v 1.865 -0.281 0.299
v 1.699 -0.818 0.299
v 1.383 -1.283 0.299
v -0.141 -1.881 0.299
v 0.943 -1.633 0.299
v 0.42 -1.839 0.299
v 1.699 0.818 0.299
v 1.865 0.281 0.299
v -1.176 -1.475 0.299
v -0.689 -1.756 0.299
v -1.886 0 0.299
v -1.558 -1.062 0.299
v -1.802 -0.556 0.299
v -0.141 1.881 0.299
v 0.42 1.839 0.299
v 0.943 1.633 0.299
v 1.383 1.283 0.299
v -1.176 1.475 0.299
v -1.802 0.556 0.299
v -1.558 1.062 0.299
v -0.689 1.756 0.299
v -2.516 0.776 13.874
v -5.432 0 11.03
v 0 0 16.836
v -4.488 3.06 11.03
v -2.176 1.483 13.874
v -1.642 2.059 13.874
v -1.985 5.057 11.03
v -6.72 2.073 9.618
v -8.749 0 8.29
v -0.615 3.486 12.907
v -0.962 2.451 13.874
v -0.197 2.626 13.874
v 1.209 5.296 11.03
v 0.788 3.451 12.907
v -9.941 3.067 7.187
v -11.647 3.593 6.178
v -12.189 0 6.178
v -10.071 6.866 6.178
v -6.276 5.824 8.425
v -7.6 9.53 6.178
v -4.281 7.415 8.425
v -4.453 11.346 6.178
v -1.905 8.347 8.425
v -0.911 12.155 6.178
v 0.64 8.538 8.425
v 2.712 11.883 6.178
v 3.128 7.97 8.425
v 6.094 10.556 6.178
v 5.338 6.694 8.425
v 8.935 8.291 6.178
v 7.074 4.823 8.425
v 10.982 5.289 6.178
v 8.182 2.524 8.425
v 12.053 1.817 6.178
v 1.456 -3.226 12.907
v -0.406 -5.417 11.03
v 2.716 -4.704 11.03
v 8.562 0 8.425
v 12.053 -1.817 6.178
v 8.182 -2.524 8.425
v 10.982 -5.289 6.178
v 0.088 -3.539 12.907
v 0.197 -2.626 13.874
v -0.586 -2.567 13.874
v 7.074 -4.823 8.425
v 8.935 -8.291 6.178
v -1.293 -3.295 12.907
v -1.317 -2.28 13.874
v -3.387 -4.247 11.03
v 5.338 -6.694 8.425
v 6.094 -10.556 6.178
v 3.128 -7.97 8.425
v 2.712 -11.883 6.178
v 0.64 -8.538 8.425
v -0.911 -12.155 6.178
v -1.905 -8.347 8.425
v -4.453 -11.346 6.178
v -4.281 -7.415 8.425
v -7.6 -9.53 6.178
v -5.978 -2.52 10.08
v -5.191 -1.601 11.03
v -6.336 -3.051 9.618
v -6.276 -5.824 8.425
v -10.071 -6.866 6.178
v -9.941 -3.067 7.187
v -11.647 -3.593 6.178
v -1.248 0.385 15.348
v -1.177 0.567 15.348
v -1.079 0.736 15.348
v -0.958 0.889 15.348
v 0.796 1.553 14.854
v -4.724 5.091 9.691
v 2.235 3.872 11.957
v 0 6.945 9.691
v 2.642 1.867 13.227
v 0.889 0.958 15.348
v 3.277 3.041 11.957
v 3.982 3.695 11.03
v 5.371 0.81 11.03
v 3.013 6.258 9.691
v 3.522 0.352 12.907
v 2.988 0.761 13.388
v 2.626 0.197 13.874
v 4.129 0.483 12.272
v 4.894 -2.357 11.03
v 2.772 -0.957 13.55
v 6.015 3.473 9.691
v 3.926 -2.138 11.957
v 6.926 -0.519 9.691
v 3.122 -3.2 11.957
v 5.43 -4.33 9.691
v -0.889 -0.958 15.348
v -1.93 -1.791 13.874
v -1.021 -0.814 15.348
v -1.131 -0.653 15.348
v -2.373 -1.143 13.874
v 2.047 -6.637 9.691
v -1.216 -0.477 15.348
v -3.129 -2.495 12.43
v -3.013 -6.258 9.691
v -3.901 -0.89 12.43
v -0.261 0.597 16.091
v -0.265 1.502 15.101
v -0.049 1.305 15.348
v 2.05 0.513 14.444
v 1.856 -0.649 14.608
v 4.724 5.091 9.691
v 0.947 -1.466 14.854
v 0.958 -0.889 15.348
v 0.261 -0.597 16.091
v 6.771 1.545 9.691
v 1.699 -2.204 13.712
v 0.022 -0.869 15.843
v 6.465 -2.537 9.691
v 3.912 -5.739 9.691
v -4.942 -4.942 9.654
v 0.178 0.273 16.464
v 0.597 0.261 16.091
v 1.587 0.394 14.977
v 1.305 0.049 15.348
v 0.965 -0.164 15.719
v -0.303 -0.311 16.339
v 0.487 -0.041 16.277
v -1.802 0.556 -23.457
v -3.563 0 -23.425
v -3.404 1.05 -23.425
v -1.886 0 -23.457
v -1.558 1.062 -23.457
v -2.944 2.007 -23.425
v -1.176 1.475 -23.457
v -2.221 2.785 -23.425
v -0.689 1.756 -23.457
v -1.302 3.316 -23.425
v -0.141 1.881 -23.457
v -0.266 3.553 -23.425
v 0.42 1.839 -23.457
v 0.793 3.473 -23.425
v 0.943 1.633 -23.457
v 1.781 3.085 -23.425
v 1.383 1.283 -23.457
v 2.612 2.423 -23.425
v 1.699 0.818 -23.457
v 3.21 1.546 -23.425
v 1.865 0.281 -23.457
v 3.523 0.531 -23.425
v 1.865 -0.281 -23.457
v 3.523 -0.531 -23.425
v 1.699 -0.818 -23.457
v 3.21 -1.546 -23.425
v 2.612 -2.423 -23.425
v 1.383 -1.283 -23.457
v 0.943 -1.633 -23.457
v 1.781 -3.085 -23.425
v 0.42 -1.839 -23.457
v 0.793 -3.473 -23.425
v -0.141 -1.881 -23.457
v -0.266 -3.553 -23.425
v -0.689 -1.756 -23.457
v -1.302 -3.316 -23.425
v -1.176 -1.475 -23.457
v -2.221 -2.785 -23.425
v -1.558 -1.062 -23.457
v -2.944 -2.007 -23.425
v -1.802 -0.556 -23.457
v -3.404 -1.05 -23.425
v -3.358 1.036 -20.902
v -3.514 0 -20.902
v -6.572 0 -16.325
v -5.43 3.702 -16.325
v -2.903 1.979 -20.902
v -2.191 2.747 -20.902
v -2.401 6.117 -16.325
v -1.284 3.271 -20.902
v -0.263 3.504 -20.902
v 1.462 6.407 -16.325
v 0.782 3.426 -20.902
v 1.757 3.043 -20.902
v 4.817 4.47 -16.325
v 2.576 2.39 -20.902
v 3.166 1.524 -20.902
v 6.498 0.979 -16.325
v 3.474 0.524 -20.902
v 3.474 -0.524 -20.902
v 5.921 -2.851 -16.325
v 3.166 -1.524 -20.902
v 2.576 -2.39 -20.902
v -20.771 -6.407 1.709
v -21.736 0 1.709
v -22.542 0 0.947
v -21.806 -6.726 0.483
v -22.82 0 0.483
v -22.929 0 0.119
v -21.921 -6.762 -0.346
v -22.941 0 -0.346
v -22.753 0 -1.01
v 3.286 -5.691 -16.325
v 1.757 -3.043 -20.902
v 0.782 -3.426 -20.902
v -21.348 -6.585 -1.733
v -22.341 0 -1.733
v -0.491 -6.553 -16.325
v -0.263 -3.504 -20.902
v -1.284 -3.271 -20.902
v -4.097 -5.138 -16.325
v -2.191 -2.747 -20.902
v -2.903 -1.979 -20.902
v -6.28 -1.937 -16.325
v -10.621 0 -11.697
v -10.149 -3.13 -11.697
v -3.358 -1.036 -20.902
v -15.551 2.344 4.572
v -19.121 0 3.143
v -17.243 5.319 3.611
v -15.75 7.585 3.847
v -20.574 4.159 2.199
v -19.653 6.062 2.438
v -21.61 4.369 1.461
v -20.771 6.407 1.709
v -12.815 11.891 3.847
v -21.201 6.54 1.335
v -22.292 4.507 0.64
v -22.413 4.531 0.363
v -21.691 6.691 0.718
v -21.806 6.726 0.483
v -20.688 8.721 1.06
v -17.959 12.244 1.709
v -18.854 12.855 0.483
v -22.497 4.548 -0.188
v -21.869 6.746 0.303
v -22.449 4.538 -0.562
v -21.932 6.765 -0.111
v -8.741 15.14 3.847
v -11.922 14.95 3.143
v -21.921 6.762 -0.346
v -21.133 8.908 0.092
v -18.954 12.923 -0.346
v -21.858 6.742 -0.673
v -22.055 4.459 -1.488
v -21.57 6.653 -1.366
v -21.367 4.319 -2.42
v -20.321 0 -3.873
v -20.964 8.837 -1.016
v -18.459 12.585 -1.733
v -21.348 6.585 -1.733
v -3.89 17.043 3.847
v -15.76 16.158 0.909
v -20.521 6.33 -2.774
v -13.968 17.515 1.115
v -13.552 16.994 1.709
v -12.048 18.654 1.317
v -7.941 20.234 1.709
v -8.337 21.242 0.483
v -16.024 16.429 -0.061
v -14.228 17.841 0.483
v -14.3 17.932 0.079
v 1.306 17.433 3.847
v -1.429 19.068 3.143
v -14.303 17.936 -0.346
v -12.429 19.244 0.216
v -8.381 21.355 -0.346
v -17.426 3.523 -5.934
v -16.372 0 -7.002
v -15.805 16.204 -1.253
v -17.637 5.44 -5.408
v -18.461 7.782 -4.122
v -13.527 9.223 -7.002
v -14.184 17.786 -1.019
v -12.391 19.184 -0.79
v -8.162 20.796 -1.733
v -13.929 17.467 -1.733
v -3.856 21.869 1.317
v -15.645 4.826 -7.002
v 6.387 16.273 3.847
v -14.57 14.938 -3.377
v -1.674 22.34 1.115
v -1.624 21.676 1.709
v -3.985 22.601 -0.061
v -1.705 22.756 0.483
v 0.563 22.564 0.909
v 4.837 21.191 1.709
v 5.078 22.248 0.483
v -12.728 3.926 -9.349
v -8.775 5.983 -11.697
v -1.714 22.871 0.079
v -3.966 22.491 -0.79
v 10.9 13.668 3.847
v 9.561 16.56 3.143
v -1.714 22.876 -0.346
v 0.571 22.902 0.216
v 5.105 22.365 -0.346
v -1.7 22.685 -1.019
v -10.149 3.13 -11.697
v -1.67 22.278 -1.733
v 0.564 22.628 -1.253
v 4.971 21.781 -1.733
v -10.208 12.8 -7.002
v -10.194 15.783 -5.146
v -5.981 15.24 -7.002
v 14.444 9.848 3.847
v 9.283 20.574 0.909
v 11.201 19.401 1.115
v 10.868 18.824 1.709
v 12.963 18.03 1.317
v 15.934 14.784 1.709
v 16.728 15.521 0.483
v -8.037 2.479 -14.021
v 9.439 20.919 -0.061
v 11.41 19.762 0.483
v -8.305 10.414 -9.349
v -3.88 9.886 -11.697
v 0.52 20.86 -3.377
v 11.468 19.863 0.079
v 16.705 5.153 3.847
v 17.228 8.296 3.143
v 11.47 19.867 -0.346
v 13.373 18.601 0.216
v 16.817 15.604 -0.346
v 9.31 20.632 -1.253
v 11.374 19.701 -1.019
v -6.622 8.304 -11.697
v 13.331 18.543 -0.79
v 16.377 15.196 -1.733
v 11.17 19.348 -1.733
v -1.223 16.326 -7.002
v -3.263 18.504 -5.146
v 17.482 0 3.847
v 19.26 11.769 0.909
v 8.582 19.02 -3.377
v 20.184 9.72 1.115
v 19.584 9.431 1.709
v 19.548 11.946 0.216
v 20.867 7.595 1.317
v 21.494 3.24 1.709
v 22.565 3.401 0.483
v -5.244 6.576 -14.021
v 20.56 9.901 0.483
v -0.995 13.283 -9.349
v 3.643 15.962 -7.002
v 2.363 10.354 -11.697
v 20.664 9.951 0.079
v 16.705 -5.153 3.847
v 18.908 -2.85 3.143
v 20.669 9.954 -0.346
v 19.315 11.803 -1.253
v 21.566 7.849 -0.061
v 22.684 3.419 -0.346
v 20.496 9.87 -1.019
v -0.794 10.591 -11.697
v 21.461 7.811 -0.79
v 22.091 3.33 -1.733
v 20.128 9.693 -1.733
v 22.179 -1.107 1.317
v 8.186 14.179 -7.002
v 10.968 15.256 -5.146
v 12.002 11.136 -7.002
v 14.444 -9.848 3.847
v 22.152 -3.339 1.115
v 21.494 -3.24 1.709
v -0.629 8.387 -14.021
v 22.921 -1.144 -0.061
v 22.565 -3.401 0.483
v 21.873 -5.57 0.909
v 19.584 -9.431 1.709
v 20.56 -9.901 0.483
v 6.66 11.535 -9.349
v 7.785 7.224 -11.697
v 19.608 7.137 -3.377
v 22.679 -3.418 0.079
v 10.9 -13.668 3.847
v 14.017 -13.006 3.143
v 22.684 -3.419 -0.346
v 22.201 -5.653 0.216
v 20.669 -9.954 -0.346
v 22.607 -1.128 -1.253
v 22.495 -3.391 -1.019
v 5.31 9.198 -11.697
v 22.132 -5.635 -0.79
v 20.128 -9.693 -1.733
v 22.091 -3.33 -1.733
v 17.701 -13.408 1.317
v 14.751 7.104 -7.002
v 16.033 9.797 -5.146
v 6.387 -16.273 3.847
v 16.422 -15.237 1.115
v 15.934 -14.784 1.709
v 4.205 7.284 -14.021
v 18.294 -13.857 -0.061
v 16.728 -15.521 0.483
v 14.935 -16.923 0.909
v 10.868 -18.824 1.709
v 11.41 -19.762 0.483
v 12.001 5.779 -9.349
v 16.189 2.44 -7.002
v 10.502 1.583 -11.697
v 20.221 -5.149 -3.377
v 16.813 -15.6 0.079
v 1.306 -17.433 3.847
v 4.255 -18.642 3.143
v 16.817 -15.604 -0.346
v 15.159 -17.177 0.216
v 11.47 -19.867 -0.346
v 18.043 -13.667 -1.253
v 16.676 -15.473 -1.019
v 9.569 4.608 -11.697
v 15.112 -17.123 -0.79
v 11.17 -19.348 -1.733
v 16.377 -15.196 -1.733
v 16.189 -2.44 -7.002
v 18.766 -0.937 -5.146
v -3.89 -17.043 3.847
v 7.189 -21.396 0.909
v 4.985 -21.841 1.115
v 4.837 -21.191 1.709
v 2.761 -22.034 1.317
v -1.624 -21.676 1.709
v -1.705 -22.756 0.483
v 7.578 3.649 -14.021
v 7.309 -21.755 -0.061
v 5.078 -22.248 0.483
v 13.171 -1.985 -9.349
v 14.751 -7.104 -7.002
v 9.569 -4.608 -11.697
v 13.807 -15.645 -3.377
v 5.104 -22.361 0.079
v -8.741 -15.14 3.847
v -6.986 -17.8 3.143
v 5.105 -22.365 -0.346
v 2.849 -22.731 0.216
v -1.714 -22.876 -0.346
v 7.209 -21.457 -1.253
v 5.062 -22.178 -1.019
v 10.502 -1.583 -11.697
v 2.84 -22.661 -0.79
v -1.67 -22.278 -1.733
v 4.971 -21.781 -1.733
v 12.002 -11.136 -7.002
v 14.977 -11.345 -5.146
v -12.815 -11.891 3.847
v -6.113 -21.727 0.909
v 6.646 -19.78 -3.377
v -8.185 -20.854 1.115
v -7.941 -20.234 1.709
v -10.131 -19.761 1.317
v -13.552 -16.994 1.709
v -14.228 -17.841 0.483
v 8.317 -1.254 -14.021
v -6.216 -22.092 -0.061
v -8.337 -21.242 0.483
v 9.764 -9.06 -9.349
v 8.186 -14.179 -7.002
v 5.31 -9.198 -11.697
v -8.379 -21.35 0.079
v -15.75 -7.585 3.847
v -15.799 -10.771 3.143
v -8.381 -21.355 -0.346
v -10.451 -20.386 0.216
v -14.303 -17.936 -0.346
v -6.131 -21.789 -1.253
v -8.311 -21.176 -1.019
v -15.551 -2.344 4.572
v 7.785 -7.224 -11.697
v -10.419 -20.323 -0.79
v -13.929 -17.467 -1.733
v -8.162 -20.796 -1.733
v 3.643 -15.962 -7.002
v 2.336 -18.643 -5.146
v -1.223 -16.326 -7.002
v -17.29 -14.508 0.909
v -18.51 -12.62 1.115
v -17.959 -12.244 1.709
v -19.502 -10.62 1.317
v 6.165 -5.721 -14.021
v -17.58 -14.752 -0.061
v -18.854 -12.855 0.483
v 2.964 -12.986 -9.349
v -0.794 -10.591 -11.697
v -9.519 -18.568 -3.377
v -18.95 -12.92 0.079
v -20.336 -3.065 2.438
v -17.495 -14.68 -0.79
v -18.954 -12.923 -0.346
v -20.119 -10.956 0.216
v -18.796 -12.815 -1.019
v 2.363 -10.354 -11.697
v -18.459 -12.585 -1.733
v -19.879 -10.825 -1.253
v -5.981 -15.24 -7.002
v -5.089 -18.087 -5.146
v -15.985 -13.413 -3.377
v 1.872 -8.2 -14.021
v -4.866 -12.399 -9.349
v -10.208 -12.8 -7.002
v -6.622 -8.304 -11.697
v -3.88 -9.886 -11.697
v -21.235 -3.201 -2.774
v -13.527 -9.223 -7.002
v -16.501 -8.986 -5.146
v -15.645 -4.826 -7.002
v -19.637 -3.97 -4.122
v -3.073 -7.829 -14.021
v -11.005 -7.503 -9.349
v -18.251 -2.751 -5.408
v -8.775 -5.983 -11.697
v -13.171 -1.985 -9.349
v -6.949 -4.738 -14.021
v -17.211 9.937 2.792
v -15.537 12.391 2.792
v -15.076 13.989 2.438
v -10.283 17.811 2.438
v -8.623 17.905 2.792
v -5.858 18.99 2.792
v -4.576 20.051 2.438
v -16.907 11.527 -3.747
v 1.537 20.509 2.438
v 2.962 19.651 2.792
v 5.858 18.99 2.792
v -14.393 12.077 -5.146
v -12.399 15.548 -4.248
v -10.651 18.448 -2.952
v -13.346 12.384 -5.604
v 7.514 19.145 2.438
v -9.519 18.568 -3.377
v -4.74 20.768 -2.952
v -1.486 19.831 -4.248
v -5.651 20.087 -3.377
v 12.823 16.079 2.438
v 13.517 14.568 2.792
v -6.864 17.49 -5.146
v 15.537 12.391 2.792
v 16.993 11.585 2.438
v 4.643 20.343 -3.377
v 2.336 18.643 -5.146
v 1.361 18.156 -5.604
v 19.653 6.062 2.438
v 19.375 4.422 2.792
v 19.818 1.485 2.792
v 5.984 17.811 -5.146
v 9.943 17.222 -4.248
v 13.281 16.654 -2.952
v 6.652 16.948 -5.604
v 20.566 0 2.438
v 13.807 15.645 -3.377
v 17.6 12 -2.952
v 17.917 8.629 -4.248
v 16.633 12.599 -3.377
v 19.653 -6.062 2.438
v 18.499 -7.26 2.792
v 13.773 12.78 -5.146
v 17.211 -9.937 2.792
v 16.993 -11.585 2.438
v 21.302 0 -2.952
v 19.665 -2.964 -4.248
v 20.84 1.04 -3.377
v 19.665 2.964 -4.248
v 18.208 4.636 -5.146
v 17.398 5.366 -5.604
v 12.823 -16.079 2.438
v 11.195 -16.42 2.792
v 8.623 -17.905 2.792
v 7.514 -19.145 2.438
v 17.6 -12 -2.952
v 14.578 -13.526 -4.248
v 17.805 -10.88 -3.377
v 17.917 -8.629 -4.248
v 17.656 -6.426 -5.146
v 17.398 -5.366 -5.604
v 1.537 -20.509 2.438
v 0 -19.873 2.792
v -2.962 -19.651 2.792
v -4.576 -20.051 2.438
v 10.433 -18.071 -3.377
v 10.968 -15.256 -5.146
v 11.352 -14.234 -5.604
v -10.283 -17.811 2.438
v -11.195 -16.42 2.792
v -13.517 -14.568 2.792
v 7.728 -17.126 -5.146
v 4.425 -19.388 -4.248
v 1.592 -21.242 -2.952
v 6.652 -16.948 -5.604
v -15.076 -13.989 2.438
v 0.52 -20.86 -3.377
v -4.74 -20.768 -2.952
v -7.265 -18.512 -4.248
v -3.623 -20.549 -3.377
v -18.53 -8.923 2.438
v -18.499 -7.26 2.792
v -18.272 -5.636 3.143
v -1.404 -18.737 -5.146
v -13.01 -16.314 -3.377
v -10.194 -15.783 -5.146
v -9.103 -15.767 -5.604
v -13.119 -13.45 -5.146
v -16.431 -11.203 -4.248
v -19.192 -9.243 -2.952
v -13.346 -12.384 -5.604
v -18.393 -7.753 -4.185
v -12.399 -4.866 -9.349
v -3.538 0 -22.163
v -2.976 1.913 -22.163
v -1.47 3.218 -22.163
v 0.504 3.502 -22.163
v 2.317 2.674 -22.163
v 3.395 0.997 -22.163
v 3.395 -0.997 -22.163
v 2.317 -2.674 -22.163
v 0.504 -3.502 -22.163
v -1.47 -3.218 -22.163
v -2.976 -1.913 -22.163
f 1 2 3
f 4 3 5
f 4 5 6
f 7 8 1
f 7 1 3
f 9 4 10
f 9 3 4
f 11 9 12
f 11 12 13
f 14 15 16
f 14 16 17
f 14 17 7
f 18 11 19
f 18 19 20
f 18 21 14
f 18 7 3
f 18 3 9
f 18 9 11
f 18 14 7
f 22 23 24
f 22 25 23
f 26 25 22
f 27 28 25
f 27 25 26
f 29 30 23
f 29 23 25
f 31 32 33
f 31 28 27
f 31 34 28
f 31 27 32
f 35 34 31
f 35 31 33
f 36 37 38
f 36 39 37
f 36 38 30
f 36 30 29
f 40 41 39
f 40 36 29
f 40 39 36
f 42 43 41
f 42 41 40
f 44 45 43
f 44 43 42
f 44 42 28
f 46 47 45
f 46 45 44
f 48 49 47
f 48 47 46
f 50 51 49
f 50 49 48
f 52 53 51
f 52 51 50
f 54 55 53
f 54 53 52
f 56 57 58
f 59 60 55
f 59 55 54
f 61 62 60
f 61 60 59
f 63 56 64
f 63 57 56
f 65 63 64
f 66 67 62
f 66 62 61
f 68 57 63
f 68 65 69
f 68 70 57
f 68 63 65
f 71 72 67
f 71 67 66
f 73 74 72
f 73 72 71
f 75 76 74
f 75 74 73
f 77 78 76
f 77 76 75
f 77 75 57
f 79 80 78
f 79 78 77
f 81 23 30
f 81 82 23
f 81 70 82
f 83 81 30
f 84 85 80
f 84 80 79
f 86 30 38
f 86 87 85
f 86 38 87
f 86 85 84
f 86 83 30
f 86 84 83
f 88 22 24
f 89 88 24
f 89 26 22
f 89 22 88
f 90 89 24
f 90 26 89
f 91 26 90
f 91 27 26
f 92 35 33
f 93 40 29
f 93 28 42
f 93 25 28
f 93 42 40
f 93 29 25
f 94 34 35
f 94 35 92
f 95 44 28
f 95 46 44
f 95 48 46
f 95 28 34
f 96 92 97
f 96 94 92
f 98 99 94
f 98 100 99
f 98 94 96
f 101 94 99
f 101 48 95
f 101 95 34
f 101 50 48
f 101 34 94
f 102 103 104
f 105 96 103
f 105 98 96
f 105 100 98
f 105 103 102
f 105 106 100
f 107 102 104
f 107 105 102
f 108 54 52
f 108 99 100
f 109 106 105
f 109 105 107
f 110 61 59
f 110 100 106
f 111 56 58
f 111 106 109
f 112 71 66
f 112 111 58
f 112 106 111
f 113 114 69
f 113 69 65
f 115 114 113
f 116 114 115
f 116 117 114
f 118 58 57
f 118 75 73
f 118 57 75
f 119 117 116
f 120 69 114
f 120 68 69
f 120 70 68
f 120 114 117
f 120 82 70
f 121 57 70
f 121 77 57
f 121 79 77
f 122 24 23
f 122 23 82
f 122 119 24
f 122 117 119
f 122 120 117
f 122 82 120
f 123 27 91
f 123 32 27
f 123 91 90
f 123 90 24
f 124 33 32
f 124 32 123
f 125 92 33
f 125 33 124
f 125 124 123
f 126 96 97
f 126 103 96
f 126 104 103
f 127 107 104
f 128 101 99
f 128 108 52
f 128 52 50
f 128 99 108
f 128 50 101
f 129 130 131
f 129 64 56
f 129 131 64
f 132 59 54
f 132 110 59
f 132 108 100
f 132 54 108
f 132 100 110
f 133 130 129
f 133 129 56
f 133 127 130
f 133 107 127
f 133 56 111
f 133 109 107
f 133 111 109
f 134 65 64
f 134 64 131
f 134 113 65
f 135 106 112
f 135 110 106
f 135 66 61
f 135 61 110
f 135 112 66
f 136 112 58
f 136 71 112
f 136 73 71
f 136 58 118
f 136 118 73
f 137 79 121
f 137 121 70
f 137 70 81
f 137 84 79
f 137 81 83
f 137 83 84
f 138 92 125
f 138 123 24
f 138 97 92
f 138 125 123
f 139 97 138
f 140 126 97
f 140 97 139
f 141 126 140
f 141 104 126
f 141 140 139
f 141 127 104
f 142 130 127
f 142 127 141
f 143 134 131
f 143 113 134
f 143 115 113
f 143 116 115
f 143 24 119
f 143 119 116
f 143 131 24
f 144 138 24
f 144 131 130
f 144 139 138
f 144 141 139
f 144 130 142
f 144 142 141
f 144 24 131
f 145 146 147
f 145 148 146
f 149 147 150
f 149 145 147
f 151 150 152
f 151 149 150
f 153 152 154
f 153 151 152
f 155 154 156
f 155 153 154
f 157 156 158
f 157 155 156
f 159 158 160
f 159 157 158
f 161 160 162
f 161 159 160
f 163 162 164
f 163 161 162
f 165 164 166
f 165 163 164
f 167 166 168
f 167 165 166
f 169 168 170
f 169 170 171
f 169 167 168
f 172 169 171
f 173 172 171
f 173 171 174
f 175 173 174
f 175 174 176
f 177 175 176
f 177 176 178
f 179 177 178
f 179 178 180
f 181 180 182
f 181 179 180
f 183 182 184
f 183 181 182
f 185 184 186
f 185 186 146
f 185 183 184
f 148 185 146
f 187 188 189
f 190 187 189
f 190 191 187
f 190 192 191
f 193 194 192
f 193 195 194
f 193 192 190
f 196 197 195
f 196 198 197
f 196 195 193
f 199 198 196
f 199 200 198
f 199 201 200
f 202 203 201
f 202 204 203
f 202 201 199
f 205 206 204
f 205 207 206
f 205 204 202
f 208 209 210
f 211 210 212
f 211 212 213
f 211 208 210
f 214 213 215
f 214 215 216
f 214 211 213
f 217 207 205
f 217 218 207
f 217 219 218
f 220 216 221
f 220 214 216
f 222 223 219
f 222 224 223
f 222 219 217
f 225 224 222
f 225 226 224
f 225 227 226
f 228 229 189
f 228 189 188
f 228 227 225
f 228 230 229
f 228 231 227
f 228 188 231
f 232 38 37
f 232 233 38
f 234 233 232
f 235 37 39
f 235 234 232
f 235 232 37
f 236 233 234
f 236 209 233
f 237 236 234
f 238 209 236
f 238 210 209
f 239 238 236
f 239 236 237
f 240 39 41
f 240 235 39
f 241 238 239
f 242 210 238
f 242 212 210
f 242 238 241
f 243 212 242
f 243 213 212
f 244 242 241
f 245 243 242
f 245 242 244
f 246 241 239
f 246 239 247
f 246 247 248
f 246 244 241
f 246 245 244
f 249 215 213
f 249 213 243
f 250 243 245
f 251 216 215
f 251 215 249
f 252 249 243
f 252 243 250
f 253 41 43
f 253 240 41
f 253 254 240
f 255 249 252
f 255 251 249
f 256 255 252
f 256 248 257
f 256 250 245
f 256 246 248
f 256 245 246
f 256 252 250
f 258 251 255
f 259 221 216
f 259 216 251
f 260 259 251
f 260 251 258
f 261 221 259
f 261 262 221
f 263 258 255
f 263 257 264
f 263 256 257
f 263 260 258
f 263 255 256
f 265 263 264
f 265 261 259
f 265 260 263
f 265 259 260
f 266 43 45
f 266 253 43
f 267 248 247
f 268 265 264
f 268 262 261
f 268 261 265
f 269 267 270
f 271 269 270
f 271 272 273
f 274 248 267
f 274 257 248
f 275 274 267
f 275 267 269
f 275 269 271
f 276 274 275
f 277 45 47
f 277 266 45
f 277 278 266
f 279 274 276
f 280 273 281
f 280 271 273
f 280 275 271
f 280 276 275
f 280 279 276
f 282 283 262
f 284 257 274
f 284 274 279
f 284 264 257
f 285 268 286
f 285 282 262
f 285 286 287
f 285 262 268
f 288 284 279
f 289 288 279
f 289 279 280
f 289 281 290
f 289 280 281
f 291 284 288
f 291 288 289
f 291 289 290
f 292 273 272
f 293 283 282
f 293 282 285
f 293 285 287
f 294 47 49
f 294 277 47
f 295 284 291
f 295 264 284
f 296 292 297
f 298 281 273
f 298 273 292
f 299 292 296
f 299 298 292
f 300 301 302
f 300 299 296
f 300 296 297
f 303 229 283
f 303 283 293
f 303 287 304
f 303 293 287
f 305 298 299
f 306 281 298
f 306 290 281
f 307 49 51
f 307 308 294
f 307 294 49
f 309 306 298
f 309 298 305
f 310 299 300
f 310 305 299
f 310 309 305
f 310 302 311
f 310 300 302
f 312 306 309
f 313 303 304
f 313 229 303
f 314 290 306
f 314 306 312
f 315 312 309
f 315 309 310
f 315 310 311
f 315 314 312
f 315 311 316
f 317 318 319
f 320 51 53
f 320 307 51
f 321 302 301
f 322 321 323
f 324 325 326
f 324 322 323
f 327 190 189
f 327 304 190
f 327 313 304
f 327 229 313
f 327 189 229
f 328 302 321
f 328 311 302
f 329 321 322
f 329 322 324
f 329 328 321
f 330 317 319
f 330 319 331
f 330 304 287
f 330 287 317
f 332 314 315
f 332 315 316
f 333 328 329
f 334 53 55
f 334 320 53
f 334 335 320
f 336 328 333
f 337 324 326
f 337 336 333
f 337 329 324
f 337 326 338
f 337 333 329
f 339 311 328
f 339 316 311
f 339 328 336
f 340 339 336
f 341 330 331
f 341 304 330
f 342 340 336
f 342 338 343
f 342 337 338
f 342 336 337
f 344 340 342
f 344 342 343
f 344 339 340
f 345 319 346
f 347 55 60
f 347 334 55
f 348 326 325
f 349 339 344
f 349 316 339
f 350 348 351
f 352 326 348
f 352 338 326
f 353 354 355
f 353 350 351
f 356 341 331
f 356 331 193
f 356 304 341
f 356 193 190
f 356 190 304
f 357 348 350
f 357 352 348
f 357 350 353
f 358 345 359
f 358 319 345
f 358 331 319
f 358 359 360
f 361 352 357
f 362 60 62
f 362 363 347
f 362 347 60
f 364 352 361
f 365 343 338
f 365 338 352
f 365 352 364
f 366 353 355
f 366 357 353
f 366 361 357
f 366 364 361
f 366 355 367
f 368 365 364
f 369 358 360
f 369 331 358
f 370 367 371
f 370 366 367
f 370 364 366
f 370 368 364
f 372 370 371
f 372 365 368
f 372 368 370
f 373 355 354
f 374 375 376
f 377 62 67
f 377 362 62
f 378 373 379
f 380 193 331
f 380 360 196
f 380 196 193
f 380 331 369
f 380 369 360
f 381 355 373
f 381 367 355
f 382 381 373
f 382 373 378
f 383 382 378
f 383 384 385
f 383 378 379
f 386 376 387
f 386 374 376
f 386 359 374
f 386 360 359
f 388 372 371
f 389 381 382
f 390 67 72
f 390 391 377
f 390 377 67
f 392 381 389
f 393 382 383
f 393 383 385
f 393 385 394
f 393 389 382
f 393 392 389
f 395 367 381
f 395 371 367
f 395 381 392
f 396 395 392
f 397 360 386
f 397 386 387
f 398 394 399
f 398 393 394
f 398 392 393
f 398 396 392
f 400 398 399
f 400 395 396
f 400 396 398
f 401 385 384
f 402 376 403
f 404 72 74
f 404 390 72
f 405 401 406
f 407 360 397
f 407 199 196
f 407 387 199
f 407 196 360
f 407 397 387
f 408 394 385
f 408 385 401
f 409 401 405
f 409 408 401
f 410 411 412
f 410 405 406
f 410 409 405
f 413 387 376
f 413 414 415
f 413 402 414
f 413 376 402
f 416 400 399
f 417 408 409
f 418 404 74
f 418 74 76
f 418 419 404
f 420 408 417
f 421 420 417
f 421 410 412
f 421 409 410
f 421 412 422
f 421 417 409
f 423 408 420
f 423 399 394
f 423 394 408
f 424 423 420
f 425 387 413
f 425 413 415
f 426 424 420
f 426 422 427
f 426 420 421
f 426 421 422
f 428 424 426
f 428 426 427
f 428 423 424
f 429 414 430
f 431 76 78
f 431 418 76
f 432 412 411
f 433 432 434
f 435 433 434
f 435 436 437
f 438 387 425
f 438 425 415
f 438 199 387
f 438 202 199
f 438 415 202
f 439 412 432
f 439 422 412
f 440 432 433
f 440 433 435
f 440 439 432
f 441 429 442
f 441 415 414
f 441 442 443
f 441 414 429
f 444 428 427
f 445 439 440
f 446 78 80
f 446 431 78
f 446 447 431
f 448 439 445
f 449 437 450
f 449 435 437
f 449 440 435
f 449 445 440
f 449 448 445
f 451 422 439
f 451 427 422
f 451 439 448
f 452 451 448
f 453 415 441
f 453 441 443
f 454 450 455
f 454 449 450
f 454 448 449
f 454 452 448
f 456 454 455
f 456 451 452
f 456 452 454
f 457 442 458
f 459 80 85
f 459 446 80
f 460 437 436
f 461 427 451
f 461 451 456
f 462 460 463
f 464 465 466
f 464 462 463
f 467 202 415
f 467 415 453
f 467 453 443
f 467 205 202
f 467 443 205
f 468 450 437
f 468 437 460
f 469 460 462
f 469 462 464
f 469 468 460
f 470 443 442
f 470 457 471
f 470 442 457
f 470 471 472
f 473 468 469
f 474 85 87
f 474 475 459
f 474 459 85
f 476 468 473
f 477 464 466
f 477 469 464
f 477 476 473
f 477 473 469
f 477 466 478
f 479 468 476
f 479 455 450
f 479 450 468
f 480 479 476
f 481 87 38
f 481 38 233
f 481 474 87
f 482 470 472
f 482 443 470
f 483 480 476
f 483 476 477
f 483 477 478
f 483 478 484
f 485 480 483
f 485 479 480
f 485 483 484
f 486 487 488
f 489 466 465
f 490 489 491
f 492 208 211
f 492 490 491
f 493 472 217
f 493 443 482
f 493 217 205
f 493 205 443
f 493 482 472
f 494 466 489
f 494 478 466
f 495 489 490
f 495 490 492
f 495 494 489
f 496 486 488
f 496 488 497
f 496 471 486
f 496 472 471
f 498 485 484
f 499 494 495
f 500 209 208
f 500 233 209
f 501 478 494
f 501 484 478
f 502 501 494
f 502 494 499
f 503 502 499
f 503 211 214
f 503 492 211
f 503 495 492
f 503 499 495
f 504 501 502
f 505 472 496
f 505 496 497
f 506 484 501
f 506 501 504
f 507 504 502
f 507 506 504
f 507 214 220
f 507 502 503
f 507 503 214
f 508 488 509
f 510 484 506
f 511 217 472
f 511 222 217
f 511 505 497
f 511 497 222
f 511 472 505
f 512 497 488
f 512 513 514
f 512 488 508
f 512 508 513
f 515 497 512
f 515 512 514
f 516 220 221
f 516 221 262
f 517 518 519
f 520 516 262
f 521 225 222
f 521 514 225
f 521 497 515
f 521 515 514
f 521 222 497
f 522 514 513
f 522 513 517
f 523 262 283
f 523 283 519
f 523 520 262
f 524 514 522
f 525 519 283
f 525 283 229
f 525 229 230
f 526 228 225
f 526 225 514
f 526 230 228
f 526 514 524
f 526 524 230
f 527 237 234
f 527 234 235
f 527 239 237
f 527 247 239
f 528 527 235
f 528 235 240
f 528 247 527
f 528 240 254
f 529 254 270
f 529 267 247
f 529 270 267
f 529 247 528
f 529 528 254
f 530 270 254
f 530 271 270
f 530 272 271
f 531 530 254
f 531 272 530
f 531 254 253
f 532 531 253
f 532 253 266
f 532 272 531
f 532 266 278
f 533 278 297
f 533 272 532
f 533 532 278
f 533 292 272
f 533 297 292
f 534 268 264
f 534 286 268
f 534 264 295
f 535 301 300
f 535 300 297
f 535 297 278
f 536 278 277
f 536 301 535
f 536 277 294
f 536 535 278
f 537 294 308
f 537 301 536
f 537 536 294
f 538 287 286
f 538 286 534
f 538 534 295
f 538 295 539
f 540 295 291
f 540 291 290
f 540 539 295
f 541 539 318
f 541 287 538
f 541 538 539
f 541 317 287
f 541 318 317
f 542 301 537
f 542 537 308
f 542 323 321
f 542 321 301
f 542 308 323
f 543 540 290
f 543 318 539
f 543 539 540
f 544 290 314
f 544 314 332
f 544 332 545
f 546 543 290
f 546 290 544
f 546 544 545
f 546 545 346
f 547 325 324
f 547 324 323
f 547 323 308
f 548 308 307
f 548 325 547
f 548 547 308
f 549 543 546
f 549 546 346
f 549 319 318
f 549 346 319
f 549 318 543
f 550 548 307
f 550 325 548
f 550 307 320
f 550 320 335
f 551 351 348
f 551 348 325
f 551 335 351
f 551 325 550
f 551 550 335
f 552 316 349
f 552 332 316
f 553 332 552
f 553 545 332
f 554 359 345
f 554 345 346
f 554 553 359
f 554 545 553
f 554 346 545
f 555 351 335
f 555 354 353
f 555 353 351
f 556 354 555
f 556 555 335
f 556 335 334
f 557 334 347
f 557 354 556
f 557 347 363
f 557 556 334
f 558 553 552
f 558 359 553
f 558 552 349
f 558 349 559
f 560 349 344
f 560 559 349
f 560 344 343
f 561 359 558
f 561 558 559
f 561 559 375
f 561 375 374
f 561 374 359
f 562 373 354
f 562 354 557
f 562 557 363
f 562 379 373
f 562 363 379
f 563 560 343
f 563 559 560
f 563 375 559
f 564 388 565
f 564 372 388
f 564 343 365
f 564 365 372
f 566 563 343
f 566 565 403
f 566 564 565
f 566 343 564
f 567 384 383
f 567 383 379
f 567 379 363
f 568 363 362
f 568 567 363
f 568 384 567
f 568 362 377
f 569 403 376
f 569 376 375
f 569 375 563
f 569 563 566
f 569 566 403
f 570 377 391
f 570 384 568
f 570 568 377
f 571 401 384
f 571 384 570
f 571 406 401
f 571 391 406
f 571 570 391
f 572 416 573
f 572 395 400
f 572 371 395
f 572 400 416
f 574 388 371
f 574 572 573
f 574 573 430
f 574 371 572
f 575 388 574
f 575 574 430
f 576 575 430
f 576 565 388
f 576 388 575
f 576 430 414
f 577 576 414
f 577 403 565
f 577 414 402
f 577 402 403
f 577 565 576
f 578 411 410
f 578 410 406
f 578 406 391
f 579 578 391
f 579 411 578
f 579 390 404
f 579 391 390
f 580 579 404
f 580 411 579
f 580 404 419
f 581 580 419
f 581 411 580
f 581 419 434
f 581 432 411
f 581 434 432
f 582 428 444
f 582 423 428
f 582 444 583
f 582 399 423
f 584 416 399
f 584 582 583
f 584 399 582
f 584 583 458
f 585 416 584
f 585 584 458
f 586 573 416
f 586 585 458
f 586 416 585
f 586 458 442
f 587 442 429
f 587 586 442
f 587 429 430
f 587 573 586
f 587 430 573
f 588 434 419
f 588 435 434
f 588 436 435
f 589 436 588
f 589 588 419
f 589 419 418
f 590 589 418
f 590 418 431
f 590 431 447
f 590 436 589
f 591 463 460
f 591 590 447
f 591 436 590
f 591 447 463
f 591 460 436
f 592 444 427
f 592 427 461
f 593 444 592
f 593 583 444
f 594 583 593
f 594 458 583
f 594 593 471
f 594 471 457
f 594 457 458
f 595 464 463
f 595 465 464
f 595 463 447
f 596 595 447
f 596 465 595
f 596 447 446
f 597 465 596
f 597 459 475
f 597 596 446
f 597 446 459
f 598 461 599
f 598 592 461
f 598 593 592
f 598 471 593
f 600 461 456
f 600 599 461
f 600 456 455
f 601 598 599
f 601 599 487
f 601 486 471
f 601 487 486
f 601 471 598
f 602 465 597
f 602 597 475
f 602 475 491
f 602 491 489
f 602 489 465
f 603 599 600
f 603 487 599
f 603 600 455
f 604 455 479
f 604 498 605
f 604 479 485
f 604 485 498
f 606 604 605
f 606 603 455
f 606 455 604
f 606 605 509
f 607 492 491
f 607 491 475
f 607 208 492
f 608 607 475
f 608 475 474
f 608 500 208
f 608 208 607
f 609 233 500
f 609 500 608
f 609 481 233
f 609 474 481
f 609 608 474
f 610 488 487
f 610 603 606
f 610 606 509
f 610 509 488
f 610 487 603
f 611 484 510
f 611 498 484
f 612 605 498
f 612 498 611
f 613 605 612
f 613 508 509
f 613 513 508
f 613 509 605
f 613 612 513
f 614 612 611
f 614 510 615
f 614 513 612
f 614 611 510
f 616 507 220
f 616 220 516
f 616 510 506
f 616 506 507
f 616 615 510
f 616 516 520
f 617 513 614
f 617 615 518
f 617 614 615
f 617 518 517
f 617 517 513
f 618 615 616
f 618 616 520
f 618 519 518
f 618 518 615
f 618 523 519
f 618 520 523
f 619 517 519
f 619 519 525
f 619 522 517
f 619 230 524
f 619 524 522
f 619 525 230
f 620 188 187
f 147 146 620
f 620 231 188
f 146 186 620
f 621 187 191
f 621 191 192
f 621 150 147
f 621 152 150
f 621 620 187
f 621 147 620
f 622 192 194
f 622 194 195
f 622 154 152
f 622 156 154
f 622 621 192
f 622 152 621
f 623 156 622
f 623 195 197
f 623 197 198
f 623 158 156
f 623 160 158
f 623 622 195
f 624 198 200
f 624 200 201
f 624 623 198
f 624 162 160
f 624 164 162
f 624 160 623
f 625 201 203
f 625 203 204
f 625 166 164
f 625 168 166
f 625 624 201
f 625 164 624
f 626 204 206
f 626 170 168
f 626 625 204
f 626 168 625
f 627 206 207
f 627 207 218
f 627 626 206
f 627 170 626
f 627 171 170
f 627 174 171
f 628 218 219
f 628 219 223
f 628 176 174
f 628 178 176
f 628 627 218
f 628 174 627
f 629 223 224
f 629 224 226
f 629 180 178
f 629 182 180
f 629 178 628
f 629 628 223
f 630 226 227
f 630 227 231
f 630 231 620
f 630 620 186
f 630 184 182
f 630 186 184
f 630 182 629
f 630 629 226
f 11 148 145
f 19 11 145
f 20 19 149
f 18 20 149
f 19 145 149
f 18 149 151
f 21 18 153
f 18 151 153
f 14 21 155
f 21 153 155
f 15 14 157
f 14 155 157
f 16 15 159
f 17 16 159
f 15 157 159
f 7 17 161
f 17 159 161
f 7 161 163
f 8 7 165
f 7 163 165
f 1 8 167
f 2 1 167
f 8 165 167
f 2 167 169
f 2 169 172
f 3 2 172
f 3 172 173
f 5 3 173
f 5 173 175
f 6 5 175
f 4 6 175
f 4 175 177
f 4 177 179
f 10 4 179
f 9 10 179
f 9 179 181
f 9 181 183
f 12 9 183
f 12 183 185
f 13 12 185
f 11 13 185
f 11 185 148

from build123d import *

# Parameters (mm, degrees)
F2_DEPTH = 18.796
F3_DEPTH = 25.4


with BuildPart() as f1:
    # F0 (on Front) → F1 (revolve)
    with BuildSketch(Plane.XZ):
        Polygon((-3.1376469415, 26.0953336054), (0, 26.0995179415), (0, 36.9026255262), (-3.1376469415, 36.9026255262), align=None)
    revolve(axis=Axis((0, 0, 11.1243847059), (0, 0, -1)))

    # F2 (cut): a face of the model
    f2_faces = [f1.faces().sort_by_distance(p)[0] for p in [
        (0, 0, 36.9026255262),
    ]]
    extrude(f2_faces, amount=-F2_DEPTH, mode=Mode.SUBTRACT)


with BuildPart() as f1b:
    # F0 (on Front) → F1, piece 2 (revolve)
    with BuildSketch(Plane.XZ):
        with BuildLine():
            Line((0, 0), (0, 16.8363694102))
            add(Edge.make_bspline(
                [(0, 16.8363694102), (-3.474241628, 12.8596777576), (-6.9484832559, 8.882986105), (-12.1888345, 6.1778346719)],
                knots=[0, 0, 0, 0, 0.2663691303, 0.2663691303, 0.2663691303, 0.2663691303], degree=3))
            add(Edge.make_bspline(
                [(-12.1888345, 6.1778346719), (-16.7755084747, 3.810121689), (-29.2204528037, 0.8901901789), (-10.2664559429, -10.2391590135), (-5.7337599776, -17.3964564632), (-3.5136023088, -20.9021689447)],
                knots=[0.2663691303, 0.2663691303, 0.2663691303, 0.2663691303, 0.4995115859, 0.7548560064, 1, 1, 1, 1], degree=3))
            Line((-3.5136023088, -20.9021689447), (-3.5625977907, -23.424660787))
            Line((-3.5625977907, -23.424660787), (-1.886081649, -23.4572245063))
            Line((-1.886081649, -23.4572245063), (0, -23.4938587097))
            Line((0, -23.4938587097), (0, -20.6523918138))
            Line((0, -20.6523918138), (0, -15.5456149951))
            Line((0, -15.5456149951), (0, -3.8507485297))
            Line((0, -3.8507485297), (0, 0))
        make_face()
        Polygon((0, -23.4938587097), (-1.886081649, -23.4572245063), (-1.886081649, -25.1011773944), (0, -25.1011773944), align=None)
    revolve(axis=Axis((0, 0, 11.1243847059), (0, 0, -1)))

    # F3 (cut): a face of the model
    f3_faces = [f1b.faces().sort_by_distance(p)[0] for p in [
        (0, 0, -25.1011773944),
    ]]
    extrude(f3_faces, amount=-F3_DEPTH, mode=Mode.SUBTRACT)


solid = f1b.part
